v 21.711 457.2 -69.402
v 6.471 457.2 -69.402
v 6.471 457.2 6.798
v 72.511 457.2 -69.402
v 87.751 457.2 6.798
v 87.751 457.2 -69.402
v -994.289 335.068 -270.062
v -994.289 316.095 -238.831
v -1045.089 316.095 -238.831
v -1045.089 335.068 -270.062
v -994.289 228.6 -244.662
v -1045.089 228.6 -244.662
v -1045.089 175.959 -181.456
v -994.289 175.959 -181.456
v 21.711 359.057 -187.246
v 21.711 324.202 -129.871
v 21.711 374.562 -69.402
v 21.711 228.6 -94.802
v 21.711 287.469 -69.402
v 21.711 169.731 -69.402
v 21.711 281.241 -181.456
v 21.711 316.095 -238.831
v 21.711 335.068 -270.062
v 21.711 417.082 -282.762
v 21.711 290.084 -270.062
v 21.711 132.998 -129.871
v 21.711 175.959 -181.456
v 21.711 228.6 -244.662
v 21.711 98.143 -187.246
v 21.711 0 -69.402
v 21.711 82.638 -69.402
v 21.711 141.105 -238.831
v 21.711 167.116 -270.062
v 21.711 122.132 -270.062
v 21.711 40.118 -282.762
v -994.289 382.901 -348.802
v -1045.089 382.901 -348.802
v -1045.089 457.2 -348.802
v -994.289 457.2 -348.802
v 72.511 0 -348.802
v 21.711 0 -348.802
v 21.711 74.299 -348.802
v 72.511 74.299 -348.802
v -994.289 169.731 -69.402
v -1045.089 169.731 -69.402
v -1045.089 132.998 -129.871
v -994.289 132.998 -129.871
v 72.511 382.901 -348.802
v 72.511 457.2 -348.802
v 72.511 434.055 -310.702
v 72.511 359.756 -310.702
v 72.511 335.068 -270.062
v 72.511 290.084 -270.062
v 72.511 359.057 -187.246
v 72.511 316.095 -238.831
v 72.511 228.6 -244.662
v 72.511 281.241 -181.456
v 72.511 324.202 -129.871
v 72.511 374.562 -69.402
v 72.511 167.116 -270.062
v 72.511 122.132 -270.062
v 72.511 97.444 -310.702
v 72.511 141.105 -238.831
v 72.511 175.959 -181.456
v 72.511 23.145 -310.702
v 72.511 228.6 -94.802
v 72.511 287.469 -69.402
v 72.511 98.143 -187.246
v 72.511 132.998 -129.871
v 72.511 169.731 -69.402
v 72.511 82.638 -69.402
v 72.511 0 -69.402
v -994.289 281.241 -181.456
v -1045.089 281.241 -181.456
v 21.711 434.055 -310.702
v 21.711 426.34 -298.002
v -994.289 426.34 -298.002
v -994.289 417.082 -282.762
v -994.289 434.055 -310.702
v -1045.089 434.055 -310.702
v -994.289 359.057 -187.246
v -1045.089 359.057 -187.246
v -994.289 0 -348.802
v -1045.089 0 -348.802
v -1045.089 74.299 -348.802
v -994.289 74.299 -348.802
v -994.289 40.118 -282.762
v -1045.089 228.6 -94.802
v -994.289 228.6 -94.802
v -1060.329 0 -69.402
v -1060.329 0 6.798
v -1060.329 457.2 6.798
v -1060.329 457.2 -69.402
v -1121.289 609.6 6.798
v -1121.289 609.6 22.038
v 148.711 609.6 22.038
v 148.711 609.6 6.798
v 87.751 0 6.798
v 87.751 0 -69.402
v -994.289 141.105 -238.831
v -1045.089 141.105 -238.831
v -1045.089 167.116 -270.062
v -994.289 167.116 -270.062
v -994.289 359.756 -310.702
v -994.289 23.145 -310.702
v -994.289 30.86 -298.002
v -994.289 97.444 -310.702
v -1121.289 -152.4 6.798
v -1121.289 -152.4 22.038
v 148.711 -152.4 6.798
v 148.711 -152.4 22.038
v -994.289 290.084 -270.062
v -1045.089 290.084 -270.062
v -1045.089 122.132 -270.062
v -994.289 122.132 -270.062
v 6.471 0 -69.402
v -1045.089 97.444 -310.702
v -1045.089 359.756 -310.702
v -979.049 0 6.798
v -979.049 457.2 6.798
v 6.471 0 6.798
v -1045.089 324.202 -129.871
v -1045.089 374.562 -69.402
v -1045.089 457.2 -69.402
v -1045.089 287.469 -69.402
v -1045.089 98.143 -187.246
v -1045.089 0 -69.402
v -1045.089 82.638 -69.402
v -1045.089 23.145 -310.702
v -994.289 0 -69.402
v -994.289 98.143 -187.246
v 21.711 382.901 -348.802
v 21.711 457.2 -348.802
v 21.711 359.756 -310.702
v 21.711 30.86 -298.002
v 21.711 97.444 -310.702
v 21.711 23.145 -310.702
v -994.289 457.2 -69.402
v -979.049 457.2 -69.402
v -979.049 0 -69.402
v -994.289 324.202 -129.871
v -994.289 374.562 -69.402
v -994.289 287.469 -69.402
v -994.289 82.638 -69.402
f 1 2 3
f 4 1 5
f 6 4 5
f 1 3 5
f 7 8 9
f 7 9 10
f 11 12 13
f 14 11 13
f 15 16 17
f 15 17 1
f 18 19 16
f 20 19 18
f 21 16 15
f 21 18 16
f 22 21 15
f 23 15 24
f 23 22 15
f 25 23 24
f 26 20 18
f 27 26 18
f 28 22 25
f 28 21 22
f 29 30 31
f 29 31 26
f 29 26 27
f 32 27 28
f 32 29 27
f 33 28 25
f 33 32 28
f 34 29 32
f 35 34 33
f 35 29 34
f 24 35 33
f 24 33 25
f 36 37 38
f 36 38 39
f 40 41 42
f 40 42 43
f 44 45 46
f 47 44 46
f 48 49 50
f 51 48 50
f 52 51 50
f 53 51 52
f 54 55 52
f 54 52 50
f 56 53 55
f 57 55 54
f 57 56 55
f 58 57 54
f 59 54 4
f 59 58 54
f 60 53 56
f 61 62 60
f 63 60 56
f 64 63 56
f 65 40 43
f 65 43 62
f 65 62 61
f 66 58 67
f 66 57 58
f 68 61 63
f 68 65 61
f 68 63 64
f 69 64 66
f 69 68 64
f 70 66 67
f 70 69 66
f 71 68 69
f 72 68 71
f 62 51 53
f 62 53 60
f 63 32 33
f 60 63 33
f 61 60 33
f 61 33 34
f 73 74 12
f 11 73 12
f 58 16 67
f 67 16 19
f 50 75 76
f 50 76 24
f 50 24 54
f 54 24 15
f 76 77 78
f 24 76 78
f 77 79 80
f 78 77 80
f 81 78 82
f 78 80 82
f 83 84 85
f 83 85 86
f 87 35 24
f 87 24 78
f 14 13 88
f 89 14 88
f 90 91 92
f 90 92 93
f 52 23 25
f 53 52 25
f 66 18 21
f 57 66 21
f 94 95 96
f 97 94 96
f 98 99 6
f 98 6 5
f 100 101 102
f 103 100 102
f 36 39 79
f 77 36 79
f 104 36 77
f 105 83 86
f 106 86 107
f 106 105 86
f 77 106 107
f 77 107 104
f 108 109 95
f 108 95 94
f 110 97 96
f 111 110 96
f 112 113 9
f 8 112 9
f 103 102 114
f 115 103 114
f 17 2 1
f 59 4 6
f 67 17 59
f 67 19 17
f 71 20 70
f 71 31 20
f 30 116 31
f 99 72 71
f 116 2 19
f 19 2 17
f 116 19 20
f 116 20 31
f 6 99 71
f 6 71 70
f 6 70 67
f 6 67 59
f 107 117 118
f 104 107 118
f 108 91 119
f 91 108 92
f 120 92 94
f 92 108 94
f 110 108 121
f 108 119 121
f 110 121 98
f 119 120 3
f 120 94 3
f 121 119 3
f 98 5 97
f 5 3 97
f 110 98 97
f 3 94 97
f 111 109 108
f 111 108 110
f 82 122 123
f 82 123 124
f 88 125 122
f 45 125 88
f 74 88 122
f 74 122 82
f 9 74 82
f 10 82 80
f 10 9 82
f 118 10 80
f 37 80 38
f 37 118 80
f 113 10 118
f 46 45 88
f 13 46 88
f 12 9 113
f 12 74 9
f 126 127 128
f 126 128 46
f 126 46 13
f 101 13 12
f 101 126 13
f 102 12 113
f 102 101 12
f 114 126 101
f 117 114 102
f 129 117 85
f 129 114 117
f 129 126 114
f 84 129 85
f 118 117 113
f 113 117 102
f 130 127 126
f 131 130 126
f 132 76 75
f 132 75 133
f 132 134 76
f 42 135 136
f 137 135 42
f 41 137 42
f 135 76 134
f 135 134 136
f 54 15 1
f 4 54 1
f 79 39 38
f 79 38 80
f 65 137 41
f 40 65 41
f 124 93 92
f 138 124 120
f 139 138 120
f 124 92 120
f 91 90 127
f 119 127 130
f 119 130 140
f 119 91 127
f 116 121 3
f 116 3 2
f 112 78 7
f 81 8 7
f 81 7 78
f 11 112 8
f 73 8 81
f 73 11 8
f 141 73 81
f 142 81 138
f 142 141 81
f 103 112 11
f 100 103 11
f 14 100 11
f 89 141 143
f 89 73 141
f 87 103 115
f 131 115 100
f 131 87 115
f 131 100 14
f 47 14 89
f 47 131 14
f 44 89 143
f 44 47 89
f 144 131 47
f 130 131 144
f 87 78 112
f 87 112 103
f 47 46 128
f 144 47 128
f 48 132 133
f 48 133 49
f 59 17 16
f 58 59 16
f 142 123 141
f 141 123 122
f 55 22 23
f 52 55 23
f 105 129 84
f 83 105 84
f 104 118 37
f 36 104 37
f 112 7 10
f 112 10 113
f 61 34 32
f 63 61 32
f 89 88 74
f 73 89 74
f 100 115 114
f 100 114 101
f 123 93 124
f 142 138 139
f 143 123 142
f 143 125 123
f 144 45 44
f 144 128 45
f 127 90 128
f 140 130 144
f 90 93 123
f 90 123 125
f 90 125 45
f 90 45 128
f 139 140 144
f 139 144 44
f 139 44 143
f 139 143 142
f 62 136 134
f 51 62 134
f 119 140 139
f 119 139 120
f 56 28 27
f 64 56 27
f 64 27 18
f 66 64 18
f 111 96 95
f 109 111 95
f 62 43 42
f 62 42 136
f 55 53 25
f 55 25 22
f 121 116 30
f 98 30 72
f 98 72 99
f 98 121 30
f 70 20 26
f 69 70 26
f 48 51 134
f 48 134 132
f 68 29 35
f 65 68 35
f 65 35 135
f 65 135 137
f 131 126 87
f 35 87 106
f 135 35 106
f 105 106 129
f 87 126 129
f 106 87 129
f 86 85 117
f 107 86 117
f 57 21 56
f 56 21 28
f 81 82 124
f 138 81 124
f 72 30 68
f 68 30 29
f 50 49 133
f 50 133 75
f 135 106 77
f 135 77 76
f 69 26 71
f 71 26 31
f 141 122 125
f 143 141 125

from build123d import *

# Parameters (mm, degrees)
F1_DEPTH      = 609.6
F1_DEPTH_BACK = 152.4
F2_DEPTH      = 457.2
F3_DEPTH      = 457.2
F5_DEPTH      = 2540


with BuildPart() as f1:
    # F0 (on Front) → F1 (new body, two sides)
    with BuildSketch(Plane.XZ) as f1_sk:
        Polygon((148.710757494, 22.0376051942), (-1121.289242506, 22.0376051942), (-1121.289242506, 6.7976051942), (-1060.329242506, 6.7976051942), (-979.049242506, 6.7976051942), (-940.949242506, 6.7976051942), (-928.249242506, 6.7976051942), (-623.449242506, 6.7976051942), (-610.749242506, 6.7976051942), (-361.829242506, 6.7976051942), (-349.129242506, 6.7976051942), (-44.329242506, 6.7976051942), (-31.629242506, 6.7976051942), (6.470757494, 6.7976051942), (87.750757494, 6.7976051942), (148.710757494, 6.7976051942), align=None)
    extrude(amount=-F1_DEPTH)
    extrude(f1_sk.sketch, amount=F1_DEPTH_BACK)

    # F0 (on Front) → F2 (join)
    with BuildSketch(Plane.XZ):
        Polygon((-979.049242506, 6.7976051942), (-1060.329242506, 6.7976051942), (-1060.329242506, -69.4023948058), (-1045.089242506, -69.4023948058), (-1045.089242506, -348.8023948058), (-994.289242506, -348.8023948058), (-994.289242506, -298.0023948058), (-994.289242506, -282.7623948058), (-994.289242506, -82.1023948058), (-994.289242506, -69.4023948058), (-979.049242506, -69.4023948058), align=None)
        Polygon((87.750757494, -69.4023948058), (87.750757494, 6.7976051942), (6.470757494, 6.7976051942), (6.470757494, -69.4023948058), (21.710757494, -69.4023948058), (21.710757494, -82.1023948058), (21.710757494, -282.7623948058), (21.710757494, -298.0023948058), (21.710757494, -348.8023948058), (72.510757494, -348.8023948058), (72.510757494, -69.4023948058), align=None)
    extrude(amount=-F2_DEPTH)

    # F0 (on Front) → F3 (join)
    with BuildSketch(Plane.XZ):
        Polygon((-486.289242506, -282.7623948058), (-994.289242506, -282.7623948058), (-994.289242506, -298.0023948058), (-486.289242506, -298.0023948058), (21.710757494, -298.0023948058), (21.710757494, -282.7623948058), align=None)
    extrude(amount=-F3_DEPTH)

    # F4 (on face) → F5 (cut)
    with BuildSketch(Plane(origin=(-1060.329242506, 0, 0), x_dir=(0, -1, 0), z_dir=(-1, 0, 0))):
        Polygon((-457.2, -270.0623948058), (-409.3666133917, -270.0623948058), (-359.05659291, -187.2455320743), (-457.2, -69.4023948058), align=None)
        Polygon((-374.5619450508, -69.4023948058), (-324.2021632287, -129.8705898486), (-287.4686281641, -69.4023948058), align=None)
        Polygon((-228.6, -94.8023948058), (-281.2405547119, -181.4556211801), (-228.6, -244.6623948058), (-175.9594452881, -181.4556211801), align=None)
        Polygon((-82.6380549492, -69.4023948058), (-169.7313718359, -69.4023948058), (-132.9978367713, -129.8705898486), align=None)
        Polygon((-98.14340709, -187.2455320743), (-47.8333866083, -270.0623948058), (0, -270.0623948058), (0, -69.4023948058), align=None)
        Polygon((-167.1158501306, -270.0623948058), (-122.1321394847, -270.0623948058), (-141.1050156067, -238.8305634058), align=None)
        Polygon((-316.0949843933, -238.8305634058), (-335.0678605153, -270.0623948058), (-290.0841498694, -270.0623948058), align=None)
        Polygon((-359.756060055, -310.7023948058), (-382.9012471236, -348.8023948058), (-74.2987528764, -348.8023948058), (-97.443939945, -310.7023948058), align=None)
        Polygon((-457.2, -310.7023948058), (-457.2, -348.8023948058), (-434.0548129315, -310.7023948058), align=None)
        Polygon((-23.1451870685, -310.7023948058), (0, -348.8023948058), (0, -310.7023948058), align=None)
        Polygon((-47.8333866083, -270.0623948058), (-23.1451870685, -310.7023948058), (0, -310.7023948058), (0, -270.0623948058), align=None)
        Polygon((-457.2, -310.7023948058), (-434.0548129315, -310.7023948058), (-409.3666133917, -270.0623948058), (-457.2, -270.0623948058), align=None)
    extrude(amount=-F5_DEPTH, mode=Mode.SUBTRACT)


solid = f1.part
